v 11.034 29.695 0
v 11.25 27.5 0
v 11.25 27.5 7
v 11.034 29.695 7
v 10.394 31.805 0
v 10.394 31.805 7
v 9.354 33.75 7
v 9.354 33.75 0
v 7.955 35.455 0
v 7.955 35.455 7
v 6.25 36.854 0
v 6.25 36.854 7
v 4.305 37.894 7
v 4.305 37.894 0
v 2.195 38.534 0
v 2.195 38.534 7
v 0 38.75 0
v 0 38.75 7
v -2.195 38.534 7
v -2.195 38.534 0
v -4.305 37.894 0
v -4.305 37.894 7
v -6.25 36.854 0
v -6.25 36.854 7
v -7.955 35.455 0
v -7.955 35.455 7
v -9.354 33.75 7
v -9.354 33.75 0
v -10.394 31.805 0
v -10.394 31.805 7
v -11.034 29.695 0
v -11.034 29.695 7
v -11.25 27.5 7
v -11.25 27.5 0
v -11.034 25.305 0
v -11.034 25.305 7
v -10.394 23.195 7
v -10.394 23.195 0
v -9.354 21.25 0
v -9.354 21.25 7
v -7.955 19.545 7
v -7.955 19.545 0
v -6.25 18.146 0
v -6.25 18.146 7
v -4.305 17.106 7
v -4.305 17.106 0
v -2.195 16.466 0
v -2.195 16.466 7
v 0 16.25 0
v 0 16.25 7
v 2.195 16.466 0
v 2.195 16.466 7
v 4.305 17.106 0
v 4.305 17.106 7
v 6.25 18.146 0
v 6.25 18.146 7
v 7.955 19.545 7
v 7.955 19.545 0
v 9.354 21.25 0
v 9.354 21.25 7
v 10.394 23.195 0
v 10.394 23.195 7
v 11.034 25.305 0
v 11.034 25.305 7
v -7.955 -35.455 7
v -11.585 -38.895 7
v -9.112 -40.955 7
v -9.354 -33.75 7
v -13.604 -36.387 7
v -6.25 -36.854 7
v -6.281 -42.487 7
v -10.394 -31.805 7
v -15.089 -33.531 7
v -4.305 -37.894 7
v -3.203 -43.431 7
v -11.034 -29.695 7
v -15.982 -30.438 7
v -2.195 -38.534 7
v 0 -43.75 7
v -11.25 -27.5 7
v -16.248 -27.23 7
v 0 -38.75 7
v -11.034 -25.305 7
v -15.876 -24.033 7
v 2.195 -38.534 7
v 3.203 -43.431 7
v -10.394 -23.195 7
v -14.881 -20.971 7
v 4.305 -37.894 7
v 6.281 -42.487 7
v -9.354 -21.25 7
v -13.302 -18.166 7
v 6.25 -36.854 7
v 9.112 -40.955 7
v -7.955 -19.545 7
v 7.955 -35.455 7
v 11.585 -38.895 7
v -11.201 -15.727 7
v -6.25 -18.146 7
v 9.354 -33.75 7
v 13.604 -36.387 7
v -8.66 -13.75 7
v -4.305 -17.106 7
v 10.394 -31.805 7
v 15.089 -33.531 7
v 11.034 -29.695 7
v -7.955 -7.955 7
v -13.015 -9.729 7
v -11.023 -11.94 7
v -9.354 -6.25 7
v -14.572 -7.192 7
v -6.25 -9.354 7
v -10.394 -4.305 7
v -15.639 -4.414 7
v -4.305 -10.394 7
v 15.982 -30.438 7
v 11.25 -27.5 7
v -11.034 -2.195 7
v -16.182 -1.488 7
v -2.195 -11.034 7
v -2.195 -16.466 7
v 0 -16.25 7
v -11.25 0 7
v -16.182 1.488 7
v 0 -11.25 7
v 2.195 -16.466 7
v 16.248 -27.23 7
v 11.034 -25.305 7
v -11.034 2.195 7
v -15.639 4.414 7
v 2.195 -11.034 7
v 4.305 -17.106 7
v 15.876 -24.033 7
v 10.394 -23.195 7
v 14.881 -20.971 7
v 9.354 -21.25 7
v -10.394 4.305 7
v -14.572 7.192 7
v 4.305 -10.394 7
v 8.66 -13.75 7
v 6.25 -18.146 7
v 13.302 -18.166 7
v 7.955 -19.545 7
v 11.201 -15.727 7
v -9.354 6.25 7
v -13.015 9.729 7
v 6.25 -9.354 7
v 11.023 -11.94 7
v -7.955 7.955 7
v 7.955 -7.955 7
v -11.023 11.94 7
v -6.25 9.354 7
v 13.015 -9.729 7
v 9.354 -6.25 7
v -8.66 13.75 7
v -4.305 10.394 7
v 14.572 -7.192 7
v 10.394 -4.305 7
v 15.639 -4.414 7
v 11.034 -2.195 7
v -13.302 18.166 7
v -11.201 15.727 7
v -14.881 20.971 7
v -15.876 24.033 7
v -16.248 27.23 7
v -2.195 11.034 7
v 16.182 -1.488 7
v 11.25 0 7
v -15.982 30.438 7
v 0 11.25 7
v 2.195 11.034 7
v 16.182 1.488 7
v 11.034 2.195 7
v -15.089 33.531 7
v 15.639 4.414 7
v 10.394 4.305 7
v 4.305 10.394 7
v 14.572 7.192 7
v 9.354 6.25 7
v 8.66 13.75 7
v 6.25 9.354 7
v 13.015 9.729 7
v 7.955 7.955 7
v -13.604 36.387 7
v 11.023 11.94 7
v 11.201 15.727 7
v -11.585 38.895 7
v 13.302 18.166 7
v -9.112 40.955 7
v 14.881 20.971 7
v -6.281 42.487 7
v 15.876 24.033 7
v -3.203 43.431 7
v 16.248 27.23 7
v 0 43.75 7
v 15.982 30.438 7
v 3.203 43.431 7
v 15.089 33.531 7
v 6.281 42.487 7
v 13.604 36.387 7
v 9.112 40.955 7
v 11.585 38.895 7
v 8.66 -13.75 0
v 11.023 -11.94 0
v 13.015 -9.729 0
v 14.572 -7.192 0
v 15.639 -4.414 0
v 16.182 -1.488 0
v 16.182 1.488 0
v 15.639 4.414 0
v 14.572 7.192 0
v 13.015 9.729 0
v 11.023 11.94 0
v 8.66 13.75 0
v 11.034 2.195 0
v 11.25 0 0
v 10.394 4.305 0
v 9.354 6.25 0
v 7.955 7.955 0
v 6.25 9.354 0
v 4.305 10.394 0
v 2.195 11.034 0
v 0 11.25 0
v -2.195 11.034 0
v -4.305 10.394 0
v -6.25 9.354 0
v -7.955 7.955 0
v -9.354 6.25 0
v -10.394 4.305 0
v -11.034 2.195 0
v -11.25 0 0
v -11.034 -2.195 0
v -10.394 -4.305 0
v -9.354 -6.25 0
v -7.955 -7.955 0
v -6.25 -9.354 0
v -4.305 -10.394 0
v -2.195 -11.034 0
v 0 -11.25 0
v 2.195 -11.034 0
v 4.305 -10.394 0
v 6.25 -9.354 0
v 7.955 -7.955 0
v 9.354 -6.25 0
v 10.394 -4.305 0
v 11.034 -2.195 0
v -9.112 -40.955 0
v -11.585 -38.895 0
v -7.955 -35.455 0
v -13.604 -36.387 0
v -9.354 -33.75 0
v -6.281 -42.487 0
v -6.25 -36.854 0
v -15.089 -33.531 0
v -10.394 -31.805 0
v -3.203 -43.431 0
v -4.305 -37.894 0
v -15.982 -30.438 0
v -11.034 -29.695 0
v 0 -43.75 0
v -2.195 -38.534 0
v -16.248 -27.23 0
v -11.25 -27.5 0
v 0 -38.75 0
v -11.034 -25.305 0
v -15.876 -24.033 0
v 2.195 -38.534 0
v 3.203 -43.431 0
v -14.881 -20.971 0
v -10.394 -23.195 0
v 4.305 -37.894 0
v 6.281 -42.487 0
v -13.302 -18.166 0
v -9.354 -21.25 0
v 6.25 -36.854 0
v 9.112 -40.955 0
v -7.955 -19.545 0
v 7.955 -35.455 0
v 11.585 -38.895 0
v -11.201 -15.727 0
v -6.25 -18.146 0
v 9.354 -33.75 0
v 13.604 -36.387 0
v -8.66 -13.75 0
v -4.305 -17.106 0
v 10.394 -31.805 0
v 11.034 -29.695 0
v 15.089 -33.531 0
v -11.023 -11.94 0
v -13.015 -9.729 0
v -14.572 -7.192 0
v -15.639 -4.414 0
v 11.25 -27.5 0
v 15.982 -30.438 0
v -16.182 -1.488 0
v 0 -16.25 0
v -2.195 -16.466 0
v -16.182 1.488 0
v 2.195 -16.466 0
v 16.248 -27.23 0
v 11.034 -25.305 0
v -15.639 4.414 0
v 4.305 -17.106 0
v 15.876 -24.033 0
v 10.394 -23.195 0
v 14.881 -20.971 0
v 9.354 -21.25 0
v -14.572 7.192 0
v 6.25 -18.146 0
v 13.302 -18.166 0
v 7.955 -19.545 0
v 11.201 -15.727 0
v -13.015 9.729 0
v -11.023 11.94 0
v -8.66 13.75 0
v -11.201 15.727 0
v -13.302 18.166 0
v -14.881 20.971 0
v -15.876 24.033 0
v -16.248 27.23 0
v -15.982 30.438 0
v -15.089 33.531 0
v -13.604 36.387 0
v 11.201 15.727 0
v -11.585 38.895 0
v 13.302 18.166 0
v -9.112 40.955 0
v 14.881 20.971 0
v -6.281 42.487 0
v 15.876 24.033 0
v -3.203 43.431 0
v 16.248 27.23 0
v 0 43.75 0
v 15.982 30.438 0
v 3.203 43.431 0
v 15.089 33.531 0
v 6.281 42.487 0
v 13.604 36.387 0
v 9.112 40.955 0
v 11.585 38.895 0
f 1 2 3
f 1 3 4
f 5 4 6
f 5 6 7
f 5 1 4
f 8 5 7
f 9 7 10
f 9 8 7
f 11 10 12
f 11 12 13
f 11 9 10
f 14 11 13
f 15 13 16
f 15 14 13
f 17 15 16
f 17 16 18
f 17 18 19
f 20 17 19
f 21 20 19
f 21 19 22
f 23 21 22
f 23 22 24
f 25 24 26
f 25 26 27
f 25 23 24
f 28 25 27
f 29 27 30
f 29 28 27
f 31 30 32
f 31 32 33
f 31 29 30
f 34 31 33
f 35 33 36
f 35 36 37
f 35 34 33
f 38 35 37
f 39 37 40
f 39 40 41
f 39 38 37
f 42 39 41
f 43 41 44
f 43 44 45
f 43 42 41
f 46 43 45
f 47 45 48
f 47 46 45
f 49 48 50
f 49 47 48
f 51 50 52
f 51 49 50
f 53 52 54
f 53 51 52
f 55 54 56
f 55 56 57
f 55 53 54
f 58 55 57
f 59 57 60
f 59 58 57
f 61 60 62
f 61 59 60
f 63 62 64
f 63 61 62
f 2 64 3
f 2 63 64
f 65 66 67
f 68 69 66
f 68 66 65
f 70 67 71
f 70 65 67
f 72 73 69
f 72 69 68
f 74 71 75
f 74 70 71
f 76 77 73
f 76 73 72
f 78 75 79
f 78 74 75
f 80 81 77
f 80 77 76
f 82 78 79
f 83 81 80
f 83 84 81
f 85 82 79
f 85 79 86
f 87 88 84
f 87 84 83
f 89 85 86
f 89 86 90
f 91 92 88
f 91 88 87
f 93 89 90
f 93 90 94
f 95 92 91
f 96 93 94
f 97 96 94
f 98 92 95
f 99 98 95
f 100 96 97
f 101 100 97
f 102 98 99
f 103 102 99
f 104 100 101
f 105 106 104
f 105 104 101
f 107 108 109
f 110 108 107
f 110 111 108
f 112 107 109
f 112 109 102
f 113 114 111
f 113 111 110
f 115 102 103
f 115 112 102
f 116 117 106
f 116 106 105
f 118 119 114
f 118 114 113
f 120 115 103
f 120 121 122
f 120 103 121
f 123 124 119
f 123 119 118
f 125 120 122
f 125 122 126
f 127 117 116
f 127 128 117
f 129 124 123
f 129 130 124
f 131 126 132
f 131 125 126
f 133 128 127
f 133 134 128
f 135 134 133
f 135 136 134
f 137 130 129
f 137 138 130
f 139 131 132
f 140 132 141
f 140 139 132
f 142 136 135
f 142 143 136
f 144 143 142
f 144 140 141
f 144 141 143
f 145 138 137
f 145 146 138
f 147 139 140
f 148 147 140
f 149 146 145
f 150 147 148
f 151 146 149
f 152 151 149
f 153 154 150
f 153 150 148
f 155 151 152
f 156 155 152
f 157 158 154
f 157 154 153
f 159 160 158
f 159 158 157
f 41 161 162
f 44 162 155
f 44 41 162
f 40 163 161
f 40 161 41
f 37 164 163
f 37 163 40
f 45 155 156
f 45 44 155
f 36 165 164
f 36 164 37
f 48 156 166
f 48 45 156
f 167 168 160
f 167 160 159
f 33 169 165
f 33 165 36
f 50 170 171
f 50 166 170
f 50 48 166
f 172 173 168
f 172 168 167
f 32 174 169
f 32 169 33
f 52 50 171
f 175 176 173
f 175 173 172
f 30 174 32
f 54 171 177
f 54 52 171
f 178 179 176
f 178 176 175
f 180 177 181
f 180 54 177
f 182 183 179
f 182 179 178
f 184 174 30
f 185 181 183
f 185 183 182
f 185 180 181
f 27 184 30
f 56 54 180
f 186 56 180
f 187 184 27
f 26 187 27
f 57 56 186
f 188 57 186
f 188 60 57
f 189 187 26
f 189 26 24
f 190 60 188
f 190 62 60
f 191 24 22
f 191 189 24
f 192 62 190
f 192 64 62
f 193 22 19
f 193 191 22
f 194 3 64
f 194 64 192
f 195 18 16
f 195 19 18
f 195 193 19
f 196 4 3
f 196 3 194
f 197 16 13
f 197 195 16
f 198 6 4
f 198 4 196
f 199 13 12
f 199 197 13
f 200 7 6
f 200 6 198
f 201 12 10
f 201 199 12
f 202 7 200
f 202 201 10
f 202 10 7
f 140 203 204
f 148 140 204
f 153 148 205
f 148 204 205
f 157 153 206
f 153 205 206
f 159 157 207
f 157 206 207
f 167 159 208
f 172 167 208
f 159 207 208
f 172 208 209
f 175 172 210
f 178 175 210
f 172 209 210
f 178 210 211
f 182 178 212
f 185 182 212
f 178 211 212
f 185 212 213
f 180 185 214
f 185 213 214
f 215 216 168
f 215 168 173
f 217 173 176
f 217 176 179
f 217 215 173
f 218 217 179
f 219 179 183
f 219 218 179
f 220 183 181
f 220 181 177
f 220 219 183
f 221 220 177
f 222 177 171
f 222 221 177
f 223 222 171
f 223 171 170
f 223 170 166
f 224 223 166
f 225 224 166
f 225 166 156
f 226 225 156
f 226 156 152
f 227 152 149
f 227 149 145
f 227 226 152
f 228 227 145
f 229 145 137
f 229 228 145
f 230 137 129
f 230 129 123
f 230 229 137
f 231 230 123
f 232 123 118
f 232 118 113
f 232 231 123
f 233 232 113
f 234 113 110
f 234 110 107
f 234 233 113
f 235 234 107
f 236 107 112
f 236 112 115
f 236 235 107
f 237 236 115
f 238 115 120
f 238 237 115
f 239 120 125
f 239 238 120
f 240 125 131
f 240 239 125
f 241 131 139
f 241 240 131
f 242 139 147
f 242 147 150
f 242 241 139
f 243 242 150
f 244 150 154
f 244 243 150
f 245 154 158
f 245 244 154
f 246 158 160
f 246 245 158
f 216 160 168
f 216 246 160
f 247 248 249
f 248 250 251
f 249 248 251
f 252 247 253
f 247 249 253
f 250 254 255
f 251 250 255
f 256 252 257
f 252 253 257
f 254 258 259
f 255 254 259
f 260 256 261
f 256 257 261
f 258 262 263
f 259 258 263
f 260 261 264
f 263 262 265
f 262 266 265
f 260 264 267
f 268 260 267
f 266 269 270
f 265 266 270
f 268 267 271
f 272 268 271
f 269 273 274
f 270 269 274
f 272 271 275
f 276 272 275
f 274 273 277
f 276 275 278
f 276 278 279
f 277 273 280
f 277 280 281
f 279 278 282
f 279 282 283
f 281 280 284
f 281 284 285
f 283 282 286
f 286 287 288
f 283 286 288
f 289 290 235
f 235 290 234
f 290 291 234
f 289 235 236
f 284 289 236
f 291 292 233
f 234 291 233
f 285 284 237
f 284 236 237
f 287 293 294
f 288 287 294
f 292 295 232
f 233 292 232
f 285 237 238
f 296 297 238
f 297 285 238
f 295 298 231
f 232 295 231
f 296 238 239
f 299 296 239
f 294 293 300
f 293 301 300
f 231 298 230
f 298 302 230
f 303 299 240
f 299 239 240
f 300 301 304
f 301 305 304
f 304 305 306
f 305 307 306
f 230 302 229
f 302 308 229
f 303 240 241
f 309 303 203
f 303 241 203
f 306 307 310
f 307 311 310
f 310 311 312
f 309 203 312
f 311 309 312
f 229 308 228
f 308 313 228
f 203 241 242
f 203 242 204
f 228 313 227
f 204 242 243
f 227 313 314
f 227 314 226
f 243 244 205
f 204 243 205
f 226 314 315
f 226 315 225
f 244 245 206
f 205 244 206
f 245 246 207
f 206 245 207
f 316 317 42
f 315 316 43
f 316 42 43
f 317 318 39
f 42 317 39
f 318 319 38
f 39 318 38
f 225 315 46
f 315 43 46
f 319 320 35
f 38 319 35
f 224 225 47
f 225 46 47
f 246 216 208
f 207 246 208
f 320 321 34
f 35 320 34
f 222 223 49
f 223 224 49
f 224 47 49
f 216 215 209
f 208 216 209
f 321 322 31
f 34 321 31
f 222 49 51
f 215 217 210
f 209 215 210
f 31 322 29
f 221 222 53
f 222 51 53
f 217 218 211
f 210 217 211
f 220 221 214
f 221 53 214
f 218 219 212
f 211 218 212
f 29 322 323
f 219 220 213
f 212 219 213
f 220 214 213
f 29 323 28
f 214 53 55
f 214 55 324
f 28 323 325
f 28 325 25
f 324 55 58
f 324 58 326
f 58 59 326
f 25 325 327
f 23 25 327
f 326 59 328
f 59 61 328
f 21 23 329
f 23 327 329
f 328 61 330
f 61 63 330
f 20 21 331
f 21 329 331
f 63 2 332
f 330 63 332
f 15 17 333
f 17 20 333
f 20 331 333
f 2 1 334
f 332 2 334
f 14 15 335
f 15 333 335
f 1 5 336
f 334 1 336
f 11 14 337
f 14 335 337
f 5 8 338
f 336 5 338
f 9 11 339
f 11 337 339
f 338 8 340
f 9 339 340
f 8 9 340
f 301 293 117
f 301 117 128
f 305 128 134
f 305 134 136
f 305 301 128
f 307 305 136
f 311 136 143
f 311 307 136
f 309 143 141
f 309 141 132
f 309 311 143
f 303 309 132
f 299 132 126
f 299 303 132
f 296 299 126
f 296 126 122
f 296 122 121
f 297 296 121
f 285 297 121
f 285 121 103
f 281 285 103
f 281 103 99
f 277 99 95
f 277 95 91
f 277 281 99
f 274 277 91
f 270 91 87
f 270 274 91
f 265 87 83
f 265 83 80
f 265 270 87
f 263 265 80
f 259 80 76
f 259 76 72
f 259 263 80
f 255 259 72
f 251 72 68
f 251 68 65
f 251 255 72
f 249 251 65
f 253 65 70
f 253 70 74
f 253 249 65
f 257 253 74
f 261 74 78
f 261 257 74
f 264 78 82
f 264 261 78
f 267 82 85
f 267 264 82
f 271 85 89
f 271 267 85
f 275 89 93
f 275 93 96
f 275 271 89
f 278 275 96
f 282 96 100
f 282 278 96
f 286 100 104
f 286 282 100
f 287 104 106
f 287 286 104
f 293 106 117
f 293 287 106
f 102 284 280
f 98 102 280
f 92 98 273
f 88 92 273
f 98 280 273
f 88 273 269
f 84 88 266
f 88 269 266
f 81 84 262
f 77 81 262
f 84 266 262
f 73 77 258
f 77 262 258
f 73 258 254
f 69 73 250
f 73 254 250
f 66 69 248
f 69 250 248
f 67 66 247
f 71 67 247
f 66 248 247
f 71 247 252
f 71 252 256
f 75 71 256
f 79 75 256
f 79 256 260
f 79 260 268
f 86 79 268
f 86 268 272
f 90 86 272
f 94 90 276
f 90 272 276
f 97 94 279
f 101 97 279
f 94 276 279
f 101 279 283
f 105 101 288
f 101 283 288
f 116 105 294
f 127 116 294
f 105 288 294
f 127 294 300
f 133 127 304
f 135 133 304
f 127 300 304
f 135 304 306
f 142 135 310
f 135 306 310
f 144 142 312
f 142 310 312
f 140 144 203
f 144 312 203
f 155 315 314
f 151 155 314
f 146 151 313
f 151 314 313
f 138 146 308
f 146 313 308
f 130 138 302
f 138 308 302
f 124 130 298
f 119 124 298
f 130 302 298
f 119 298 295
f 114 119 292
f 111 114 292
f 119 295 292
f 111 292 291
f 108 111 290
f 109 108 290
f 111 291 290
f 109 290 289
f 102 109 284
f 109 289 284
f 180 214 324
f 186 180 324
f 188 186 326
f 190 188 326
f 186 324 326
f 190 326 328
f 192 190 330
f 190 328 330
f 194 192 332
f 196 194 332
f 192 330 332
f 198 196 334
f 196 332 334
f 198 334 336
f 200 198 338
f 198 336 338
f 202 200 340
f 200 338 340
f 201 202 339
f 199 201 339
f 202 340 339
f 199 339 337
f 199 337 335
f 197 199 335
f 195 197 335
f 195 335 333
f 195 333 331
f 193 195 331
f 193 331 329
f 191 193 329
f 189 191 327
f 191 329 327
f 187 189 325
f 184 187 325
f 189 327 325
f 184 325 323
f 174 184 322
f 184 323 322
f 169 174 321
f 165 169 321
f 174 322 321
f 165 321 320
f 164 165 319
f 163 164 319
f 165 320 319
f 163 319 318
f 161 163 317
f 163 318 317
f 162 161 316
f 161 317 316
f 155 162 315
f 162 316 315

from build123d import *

# Parameters (mm, degrees)
F0_R     = 11.25
F1_DEPTH = 7


with BuildPart() as f1:
    # F0 (on Top) → F1 (new body)
    with BuildSketch(Plane.XY):
        with BuildLine():
            ThreePointArc((8.660254, -13.75), (16.25, 0), (8.660254, 13.75))
            ThreePointArc((8.660254, 13.75), (0, 43.75), (-8.660254, 13.75))
            ThreePointArc((-8.660254, 13.75), (-16.25, 0), (-8.660254, -13.75))
            ThreePointArc((-8.660254, -13.75), (0, -43.75), (8.660254, -13.75))
        make_face()
        with Locations((0, -27.5)):
            Circle(F0_R, mode=Mode.SUBTRACT)
        Circle(F0_R, mode=Mode.SUBTRACT)
        with Locations((0, 27.5)):
            Circle(F0_R, mode=Mode.SUBTRACT)
    extrude(amount=F1_DEPTH)


solid = f1.part
